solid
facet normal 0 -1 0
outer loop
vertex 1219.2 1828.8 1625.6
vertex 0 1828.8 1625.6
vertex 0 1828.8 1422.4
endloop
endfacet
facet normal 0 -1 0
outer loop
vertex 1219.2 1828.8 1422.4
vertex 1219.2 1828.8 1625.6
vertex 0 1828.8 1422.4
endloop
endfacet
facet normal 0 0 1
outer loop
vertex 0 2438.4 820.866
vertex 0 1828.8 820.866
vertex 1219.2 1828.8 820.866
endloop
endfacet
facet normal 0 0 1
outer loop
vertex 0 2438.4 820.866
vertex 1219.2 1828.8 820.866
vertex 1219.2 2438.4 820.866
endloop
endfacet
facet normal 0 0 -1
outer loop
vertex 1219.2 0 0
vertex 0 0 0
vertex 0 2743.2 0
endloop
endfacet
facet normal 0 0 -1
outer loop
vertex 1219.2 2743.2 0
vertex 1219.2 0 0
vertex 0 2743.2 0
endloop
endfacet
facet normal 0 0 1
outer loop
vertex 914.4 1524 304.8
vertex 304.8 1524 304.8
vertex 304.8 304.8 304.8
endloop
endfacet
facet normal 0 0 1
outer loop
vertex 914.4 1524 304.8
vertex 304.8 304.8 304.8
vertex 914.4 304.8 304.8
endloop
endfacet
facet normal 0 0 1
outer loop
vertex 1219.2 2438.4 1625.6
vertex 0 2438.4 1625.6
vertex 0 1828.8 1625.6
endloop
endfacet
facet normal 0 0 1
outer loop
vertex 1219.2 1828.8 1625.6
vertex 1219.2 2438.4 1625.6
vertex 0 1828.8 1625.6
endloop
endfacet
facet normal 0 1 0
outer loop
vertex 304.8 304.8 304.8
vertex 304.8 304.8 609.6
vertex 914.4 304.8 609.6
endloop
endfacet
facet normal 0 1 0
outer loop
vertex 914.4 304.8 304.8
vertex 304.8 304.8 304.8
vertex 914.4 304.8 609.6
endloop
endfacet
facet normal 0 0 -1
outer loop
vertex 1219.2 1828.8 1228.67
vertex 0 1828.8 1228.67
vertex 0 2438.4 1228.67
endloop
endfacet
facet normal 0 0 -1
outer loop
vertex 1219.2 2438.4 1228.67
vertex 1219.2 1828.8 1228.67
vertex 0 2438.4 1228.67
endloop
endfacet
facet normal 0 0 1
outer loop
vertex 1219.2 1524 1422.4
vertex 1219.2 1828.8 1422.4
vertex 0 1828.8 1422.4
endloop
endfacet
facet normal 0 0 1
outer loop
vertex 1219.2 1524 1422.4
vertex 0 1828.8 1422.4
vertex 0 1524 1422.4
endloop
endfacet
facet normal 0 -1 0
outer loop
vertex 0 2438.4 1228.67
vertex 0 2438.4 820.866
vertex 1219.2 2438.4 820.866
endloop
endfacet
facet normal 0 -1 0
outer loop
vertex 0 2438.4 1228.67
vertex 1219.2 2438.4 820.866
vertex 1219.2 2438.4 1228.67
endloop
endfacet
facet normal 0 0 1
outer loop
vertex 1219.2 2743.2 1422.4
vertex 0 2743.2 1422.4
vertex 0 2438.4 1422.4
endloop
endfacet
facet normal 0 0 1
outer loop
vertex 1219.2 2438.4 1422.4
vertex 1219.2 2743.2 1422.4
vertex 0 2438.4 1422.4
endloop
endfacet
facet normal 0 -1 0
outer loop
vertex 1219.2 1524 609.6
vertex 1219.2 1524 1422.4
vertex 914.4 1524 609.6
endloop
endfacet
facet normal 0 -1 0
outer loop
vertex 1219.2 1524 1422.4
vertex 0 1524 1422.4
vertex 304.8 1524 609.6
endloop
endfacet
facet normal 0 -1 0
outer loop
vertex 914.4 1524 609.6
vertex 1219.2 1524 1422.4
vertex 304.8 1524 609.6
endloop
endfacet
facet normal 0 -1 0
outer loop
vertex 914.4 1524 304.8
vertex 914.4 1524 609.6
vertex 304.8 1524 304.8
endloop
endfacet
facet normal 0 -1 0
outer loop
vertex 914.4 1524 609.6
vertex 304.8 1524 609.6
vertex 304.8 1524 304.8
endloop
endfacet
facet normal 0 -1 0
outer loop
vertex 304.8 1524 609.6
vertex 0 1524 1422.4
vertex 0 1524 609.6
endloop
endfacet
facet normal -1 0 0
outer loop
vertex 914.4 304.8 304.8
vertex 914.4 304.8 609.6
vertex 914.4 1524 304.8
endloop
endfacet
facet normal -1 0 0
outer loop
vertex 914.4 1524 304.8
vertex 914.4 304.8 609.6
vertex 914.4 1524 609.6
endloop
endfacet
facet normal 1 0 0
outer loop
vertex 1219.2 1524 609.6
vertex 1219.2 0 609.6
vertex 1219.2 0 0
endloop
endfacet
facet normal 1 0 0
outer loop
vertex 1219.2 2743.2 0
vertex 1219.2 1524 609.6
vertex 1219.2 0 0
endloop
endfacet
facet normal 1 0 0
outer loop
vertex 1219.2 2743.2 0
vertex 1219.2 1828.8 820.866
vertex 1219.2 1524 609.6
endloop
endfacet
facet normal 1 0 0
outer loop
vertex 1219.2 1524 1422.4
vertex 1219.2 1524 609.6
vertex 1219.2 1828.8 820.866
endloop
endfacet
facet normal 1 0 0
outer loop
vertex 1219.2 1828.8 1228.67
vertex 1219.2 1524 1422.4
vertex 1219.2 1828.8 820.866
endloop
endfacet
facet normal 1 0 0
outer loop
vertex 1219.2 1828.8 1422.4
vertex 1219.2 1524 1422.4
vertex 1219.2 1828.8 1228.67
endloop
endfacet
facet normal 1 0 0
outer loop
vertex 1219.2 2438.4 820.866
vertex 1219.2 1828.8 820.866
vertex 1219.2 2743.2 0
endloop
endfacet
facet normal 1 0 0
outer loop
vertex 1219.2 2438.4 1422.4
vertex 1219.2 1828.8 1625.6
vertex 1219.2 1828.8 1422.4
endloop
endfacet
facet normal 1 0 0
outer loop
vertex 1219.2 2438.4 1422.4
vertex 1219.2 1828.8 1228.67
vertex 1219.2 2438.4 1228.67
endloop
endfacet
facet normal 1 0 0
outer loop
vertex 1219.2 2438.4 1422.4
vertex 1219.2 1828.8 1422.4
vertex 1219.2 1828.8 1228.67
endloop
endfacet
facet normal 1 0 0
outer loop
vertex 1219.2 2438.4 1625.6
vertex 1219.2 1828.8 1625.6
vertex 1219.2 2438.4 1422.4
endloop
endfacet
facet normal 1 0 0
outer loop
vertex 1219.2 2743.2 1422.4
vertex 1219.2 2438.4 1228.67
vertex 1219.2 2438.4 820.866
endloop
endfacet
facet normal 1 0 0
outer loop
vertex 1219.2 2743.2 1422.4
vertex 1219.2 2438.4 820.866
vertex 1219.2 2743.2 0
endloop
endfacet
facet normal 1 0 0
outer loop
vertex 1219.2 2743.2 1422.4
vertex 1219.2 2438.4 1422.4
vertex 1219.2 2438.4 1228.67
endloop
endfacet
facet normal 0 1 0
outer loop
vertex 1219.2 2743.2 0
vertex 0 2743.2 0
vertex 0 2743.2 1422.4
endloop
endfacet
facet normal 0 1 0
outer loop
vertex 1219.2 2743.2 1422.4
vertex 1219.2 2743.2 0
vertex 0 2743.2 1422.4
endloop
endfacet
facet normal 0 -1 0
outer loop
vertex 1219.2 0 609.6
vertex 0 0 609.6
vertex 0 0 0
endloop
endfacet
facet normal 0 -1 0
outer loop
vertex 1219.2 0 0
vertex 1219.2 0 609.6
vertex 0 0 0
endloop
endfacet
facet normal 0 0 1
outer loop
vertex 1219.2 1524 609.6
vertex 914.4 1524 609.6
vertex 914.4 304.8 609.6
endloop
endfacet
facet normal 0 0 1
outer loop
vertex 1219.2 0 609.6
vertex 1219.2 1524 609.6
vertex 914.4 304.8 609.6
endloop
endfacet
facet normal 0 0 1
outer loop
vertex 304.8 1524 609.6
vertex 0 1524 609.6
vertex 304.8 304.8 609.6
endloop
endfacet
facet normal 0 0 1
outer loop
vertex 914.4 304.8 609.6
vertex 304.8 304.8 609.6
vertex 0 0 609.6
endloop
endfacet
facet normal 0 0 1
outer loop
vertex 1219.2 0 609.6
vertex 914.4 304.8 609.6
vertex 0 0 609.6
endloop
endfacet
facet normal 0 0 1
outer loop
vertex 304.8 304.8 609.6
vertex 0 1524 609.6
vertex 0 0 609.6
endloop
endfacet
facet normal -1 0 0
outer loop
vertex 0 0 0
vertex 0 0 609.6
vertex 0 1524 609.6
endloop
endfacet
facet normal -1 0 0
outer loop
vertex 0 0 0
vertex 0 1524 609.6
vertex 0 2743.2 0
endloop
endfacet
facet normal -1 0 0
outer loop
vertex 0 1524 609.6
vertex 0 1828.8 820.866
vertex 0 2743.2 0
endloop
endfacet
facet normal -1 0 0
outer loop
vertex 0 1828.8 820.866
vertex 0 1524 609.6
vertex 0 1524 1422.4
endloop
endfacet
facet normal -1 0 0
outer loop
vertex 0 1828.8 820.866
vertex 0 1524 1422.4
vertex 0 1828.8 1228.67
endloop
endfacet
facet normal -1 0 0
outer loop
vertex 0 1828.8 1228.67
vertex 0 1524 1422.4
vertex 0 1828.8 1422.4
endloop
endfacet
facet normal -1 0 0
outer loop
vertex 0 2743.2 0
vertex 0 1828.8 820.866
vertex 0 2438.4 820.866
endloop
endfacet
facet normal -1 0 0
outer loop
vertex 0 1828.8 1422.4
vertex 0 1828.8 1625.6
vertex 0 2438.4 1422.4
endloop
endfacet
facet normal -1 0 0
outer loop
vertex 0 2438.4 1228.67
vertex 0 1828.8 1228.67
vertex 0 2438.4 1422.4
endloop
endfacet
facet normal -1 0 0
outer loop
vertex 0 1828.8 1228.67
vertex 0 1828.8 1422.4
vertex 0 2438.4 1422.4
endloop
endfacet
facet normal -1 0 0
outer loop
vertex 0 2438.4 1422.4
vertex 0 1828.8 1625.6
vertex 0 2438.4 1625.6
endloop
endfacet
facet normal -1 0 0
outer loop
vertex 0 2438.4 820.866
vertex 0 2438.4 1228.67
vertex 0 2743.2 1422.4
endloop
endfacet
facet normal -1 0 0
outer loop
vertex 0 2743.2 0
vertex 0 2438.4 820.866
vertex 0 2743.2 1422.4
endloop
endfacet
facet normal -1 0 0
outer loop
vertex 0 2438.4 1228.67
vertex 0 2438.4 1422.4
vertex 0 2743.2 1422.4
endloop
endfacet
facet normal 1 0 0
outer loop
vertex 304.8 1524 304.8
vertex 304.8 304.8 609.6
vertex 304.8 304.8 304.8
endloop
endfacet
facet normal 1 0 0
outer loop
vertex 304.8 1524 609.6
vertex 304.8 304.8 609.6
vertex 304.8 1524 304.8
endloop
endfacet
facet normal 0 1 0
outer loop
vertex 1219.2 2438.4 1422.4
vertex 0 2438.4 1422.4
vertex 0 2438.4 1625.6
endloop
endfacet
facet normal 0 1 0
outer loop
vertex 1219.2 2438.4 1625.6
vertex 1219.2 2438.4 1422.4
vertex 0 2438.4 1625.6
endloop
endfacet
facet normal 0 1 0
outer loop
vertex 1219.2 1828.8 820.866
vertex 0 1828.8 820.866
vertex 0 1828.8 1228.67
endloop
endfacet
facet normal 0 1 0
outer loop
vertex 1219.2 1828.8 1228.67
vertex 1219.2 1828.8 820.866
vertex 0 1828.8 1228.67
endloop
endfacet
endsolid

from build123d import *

# Parameters (mm, degrees)
F0_W     = 609.6
F0_H     = 407.804668
F1_DEPTH = 1219.2
F2_W     = 609.6
F2_H     = 1219.2
F3_DEPTH = 304.8


with BuildPart() as f1:
    # F0 (on Right) → F1 (new body)
    with BuildSketch(Plane.YZ):
        Polygon((0, 609.6), (0, 0), (2743.2, 0), (2743.2, 1422.4), (2438.4, 1422.4), (2438.4, 1625.6), (1828.8, 1625.6), (1828.8, 1422.4), (1524, 1422.4), (1524, 609.6), align=None)
        with Locations((2133.6, 1024.768025)):
            Rectangle(F0_W, F0_H, mode=Mode.SUBTRACT)
    extrude(amount=F1_DEPTH)

    # F2 (on face) → F3 (cut)
    with BuildSketch(Plane.XY.offset(609.6)):
        with Locations((609.6, 914.4)):
            Rectangle(F2_W, F2_H)
    extrude(amount=-F3_DEPTH, mode=Mode.SUBTRACT)


solid = f1.part
